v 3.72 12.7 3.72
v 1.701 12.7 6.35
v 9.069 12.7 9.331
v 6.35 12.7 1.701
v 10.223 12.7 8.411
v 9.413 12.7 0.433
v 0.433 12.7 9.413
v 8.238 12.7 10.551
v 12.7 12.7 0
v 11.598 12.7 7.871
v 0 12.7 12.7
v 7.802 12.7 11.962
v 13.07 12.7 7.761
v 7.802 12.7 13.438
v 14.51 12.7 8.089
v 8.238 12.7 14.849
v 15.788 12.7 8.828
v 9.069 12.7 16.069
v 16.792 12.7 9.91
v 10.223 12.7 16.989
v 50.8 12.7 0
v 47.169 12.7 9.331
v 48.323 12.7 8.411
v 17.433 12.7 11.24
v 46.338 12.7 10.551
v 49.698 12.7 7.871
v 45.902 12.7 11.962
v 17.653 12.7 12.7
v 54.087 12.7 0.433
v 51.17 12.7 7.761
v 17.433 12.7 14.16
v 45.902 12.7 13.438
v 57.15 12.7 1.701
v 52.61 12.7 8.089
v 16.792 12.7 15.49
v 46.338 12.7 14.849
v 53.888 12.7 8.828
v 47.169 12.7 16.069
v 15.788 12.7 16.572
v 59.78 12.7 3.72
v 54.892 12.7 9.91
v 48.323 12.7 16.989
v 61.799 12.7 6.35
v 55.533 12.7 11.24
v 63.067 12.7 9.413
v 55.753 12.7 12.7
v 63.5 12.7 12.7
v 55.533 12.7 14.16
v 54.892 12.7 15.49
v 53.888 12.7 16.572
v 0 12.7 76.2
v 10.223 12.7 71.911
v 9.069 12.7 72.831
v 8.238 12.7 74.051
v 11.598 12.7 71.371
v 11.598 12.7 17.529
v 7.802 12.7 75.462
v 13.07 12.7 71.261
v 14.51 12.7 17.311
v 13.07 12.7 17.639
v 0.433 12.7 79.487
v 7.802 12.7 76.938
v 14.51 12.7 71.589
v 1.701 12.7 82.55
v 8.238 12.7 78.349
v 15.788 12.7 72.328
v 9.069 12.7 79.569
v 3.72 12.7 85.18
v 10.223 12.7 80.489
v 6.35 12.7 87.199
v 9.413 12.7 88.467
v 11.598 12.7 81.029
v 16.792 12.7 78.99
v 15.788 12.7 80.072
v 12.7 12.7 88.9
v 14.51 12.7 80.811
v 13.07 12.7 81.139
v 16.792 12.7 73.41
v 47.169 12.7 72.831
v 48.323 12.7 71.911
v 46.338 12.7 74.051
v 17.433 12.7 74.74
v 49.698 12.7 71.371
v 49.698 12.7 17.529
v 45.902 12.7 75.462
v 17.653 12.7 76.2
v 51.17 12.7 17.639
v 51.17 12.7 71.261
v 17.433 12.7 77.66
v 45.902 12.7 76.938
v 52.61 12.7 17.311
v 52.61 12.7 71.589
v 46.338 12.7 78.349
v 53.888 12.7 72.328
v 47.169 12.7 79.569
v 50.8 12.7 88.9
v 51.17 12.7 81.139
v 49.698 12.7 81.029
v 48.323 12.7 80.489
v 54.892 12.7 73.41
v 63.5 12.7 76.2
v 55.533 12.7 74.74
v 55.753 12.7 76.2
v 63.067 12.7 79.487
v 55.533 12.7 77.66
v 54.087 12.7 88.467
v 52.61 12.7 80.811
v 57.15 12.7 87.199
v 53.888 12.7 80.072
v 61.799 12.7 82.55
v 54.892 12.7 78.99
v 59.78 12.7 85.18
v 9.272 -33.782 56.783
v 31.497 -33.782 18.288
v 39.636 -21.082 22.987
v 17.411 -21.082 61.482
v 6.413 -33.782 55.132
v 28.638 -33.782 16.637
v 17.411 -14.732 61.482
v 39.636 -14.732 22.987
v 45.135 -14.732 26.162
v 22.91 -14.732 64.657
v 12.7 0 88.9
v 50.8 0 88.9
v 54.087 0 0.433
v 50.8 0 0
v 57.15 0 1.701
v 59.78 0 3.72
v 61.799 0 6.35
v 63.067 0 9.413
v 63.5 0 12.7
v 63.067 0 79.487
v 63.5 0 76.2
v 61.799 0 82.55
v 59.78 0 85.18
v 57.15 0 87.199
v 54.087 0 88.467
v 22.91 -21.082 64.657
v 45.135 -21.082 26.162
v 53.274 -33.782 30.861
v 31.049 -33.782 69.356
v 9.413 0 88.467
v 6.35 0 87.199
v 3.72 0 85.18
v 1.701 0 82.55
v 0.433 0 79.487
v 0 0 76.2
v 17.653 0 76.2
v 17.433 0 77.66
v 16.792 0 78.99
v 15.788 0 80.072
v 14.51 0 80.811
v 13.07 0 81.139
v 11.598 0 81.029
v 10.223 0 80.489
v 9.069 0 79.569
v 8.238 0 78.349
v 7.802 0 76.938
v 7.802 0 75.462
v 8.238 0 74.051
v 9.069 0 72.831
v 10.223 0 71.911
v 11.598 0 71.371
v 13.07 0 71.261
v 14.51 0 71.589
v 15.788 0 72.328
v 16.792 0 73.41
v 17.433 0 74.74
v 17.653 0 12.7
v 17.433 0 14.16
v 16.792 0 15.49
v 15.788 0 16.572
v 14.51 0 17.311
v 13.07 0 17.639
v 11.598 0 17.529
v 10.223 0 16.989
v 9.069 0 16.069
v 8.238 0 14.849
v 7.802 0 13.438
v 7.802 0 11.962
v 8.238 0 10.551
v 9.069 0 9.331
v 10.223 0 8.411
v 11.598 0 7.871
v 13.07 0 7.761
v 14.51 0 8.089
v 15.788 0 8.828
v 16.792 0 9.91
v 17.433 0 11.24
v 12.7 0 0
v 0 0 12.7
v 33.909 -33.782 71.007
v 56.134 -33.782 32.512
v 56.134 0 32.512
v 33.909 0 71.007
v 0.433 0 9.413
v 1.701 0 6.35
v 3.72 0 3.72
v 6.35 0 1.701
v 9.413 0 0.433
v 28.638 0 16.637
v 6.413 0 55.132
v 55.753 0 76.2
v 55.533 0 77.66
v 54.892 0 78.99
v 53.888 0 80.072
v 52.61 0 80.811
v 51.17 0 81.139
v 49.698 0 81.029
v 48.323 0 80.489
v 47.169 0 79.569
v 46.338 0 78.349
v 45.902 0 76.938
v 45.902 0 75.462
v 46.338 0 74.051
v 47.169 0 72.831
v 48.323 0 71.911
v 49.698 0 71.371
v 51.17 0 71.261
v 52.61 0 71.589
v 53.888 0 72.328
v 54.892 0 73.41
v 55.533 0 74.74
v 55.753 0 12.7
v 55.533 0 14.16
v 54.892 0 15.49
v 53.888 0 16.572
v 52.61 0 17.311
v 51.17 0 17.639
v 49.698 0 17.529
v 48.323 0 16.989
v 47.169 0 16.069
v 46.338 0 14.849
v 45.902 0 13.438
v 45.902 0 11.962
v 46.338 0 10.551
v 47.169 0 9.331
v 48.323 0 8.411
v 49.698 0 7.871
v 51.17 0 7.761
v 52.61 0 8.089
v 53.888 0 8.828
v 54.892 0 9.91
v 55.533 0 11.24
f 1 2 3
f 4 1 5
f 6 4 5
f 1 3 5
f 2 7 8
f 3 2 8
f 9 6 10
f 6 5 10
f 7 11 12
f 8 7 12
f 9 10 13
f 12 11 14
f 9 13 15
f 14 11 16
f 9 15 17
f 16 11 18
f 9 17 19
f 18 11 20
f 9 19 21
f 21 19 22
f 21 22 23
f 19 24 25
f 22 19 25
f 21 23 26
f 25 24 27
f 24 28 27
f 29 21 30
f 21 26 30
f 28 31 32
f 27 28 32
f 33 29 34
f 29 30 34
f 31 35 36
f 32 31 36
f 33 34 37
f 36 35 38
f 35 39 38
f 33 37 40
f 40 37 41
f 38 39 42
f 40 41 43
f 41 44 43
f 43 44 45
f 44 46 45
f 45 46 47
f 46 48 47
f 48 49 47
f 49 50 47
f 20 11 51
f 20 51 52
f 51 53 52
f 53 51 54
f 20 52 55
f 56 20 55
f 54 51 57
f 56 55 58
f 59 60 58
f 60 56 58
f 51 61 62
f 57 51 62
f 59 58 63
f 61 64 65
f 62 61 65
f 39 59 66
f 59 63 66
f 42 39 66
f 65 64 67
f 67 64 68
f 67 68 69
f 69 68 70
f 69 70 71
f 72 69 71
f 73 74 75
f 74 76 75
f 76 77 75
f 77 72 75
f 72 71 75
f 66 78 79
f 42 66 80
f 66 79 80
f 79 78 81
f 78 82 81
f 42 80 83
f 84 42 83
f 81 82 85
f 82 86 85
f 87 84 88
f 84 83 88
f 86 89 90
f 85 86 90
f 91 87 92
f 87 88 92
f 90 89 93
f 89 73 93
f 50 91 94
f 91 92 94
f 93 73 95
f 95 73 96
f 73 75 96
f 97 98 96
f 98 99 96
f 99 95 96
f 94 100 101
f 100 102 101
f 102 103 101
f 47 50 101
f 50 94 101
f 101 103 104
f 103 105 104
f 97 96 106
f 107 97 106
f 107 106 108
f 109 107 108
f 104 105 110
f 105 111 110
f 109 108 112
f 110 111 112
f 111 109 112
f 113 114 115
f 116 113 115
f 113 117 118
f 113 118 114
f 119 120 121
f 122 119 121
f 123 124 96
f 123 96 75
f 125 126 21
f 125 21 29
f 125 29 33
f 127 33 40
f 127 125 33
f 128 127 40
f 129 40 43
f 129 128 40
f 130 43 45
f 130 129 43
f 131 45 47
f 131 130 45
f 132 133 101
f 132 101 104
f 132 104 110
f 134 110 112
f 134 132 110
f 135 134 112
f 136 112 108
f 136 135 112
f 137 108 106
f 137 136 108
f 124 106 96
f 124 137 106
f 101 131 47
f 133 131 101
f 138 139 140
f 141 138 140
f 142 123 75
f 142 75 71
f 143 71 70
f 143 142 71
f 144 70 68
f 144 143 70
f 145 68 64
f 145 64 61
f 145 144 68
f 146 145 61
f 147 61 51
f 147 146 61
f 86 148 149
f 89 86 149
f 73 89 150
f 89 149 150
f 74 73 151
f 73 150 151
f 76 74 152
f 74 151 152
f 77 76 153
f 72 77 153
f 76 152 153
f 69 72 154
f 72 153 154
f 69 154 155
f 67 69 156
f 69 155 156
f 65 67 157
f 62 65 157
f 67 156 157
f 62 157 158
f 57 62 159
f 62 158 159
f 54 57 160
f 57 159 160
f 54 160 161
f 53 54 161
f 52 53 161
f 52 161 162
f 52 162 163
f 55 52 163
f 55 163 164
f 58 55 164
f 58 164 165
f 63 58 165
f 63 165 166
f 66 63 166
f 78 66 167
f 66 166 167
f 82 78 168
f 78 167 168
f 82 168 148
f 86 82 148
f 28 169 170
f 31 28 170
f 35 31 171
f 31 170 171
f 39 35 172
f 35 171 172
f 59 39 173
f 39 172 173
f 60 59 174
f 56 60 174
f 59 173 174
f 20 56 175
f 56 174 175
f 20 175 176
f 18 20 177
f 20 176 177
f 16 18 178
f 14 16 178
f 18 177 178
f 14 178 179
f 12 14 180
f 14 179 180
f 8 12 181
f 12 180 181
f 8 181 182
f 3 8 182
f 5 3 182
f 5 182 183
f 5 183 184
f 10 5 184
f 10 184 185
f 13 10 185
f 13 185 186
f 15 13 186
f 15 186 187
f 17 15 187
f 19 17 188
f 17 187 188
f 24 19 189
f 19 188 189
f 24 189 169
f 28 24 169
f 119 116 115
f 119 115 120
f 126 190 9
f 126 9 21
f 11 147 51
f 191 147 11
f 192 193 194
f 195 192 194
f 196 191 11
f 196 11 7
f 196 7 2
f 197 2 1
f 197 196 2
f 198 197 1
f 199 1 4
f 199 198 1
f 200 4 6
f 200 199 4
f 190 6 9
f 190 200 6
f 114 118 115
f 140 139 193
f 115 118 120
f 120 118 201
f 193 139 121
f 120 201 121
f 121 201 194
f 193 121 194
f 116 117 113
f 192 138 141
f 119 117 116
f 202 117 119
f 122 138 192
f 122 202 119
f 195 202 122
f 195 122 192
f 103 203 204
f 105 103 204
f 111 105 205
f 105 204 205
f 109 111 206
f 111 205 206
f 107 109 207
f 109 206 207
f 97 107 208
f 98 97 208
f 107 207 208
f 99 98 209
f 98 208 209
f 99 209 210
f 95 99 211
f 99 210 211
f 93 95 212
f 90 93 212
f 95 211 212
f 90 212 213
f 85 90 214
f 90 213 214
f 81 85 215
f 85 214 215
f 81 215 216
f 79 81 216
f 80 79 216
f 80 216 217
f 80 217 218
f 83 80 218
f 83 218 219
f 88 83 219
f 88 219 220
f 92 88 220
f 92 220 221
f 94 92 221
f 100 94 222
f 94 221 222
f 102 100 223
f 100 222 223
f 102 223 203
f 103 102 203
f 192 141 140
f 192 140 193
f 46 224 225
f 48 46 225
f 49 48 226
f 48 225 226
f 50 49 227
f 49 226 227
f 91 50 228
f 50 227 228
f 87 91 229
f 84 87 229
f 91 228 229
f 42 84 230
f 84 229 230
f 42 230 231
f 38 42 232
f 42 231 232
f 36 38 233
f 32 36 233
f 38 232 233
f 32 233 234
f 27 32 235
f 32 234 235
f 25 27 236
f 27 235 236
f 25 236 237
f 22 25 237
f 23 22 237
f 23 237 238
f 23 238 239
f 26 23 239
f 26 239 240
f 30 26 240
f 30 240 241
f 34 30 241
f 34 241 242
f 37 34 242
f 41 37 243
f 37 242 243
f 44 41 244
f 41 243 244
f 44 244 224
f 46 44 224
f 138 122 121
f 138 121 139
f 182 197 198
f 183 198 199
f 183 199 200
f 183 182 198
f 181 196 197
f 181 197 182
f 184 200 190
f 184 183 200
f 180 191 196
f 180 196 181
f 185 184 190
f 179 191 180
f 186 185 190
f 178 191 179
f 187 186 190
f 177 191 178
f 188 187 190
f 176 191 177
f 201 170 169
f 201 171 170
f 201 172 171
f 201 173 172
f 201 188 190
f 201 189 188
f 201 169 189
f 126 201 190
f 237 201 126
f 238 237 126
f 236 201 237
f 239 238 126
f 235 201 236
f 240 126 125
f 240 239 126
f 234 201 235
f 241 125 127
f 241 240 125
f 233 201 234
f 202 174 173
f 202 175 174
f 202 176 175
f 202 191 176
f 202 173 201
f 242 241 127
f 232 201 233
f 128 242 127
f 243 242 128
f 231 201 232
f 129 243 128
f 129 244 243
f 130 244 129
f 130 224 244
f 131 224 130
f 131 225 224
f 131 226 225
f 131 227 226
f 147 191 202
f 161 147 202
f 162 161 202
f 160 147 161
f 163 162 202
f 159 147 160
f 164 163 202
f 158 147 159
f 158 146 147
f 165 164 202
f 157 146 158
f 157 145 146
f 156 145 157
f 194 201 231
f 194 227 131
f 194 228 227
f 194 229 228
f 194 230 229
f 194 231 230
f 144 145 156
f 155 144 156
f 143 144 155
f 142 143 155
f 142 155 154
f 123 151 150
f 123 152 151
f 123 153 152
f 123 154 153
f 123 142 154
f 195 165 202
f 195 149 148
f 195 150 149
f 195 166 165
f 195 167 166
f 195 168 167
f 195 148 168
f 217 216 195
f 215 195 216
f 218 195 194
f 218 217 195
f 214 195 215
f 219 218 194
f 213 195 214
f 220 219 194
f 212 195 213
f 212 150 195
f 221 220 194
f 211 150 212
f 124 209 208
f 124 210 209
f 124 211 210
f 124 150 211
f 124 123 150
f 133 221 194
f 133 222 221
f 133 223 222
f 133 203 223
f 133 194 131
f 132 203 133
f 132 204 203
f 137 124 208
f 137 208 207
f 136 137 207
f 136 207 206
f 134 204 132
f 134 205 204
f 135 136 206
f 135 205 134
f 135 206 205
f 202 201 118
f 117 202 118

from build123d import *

# Parameters (mm, degrees)
F0_R     = 4.953
F1_DEPTH = 12.7
F4_DEPTH = 44.45


with BuildPart() as f1:
    # F0 (on Front) → F1 (new body)
    with BuildSketch(Plane.XZ):
        with BuildLine():
            ThreePointArc((0, 12.7), (3.719744, 3.719744), (12.7, 0))
            Line((12.7, 0), (50.8, 0))
            ThreePointArc((50.8, 0), (59.780256, 3.719744), (63.5, 12.7))
            Line((63.5, 12.7), (63.5, 32.512))
            Line((63.5, 32.512), (63.5, 45.212))
            Line((63.5, 45.212), (63.5, 76.2))
            ThreePointArc((63.5, 76.2), (59.780256, 85.180256), (50.8, 88.9))
            Line((50.8, 88.9), (12.7, 88.9))
            ThreePointArc((12.7, 88.9), (3.719744, 85.180256), (0, 76.2))
            Line((0, 76.2), (0, 12.7))
        make_face()
        with Locations((12.7, 12.7)):
            Circle(F0_R, mode=Mode.SUBTRACT)
        Polygon((33.909, 71.006829), (56.134, 32.512), (28.637693, 16.637), (6.412693, 55.131829), align=None, mode=Mode.SUBTRACT)
        with Locations((50.8, 12.7)):
            Circle(F0_R, mode=Mode.SUBTRACT)
        with Locations((12.7, 76.2)):
            Circle(F0_R, mode=Mode.SUBTRACT)
        with Locations((50.8, 76.2)):
            Circle(F0_R, mode=Mode.SUBTRACT)
        Polygon((28.637693, 16.637), (56.134, 32.512), (33.909, 71.006829), (6.412693, 55.131829), align=None)
    extrude(amount=-F1_DEPTH)

    # F3 (on face) → F4 (join, through all)
    with BuildSketch(Plane(origin=(-0.044609, 0, 0.077265), x_dir=(0.866025, 0, 0.5), z_dir=(-0.5, 0, 0.866025))):
        Polygon((64.86947, 0), (33.11947, 0), (33.11947, -14.732), (33.11947, -33.782), (36.42147, -33.782), (45.81947, -21.082), (45.81947, -14.732), (48.99447, -14.732), (52.16947, -14.732), (52.16947, -21.082), (61.56747, -33.782), (64.86947, -33.782), align=None)
    extrude(amount=F4_DEPTH)


solid = f1.part
